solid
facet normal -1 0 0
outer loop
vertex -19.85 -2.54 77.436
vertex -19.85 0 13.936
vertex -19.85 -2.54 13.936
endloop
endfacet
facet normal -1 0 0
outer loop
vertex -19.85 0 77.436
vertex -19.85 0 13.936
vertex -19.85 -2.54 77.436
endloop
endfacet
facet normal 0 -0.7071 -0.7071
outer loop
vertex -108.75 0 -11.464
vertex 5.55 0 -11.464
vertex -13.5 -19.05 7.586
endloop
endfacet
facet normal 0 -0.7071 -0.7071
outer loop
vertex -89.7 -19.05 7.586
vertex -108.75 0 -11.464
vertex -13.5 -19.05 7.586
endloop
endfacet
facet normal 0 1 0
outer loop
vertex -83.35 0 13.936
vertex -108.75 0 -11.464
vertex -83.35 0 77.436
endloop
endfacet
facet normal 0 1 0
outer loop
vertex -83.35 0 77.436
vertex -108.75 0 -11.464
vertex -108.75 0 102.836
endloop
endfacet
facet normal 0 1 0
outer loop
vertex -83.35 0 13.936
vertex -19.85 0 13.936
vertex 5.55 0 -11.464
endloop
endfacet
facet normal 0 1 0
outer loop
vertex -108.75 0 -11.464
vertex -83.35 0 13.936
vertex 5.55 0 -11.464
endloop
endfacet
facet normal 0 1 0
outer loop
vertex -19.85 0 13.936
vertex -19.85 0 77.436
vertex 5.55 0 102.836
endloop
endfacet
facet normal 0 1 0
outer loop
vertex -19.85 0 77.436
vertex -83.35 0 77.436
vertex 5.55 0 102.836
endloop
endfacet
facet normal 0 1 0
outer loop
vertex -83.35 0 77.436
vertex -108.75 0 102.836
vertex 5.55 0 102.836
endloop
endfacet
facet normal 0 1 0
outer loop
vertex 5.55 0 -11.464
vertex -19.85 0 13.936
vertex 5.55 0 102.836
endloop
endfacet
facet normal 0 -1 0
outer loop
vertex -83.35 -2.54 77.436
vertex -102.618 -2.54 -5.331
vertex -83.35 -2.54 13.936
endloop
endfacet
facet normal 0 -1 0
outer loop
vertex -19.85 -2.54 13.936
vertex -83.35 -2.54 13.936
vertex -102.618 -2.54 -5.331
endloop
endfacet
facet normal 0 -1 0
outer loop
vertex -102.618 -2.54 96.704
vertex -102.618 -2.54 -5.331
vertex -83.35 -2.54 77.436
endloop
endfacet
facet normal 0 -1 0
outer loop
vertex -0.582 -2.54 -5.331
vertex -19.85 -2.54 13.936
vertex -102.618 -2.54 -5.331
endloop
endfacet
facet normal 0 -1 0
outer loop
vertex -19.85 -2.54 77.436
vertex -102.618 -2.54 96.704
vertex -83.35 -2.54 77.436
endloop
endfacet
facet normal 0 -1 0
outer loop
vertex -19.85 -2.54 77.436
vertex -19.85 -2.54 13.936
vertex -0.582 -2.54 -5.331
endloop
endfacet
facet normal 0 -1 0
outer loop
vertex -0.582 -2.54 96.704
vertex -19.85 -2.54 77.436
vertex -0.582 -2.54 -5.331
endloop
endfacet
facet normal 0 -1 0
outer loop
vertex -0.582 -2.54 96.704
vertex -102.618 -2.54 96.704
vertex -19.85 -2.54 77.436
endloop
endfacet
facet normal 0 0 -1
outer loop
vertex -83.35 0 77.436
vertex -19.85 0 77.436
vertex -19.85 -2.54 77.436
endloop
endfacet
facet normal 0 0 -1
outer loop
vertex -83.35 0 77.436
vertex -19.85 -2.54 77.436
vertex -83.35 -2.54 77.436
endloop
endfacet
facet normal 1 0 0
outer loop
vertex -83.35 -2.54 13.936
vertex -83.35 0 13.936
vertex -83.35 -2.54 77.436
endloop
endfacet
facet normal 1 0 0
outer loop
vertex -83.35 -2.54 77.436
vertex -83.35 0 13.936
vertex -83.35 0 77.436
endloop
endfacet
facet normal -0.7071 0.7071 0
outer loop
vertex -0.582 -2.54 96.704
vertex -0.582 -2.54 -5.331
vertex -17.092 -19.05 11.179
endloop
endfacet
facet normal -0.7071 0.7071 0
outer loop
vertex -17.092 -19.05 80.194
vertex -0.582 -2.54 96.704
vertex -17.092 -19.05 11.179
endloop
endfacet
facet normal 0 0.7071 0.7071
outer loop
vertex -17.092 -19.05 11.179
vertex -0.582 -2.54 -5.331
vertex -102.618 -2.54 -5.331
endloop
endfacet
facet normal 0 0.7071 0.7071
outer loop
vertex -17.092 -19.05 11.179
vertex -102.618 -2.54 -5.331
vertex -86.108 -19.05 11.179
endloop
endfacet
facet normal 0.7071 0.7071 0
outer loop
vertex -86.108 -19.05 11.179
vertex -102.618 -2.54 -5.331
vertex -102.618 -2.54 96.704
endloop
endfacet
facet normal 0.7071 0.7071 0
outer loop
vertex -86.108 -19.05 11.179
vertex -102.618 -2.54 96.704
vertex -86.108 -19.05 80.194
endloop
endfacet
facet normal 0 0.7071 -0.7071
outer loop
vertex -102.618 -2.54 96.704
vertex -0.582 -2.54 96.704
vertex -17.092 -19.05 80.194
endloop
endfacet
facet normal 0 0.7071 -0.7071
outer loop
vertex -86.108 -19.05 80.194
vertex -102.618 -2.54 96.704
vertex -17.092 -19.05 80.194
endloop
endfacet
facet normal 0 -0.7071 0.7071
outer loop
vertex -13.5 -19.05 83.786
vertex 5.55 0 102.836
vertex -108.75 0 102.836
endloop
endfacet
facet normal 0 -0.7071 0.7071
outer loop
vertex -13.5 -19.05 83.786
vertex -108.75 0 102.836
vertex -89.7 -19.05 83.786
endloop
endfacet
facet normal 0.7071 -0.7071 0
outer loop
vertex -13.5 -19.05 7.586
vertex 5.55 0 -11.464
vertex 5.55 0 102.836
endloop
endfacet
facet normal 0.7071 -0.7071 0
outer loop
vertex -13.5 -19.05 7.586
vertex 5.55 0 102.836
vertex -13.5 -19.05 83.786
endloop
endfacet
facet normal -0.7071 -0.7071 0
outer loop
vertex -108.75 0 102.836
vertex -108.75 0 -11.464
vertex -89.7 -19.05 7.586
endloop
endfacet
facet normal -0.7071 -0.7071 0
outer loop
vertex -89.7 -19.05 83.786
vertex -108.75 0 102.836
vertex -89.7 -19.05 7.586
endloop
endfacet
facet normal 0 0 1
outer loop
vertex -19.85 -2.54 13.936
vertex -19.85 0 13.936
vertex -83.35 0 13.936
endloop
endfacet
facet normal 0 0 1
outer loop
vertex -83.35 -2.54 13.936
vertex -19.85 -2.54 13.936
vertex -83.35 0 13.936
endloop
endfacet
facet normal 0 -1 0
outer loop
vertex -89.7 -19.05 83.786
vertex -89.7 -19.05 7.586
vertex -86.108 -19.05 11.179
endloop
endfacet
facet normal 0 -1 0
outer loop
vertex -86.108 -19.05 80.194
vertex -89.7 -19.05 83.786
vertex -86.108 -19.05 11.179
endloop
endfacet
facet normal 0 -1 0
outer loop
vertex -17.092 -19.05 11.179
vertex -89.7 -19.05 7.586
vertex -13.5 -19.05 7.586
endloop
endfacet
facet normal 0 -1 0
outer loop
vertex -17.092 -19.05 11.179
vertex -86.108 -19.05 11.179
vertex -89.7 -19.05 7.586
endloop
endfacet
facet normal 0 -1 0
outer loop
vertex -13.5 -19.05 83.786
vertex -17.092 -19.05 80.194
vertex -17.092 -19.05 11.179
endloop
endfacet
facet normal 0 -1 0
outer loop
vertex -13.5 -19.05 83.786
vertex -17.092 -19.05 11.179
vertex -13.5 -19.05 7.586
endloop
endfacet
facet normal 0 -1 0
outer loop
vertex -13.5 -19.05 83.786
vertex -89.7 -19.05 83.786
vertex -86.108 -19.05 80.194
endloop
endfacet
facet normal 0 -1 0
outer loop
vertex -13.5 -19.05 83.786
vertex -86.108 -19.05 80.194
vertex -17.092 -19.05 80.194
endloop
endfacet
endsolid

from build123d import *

# Parameters (mm, degrees)
F0_W        = 127
F0_H        = 127
F1_DEPTH    = 19.05
F2_T1_DEPTH = 257.6414957887
F2_T3_DEPTH = 257.6414957887
F3_T        = -2.54
F4_W        = 63.5
F4_H        = 63.5
F5_DEPTH    = 25.4


# Not quite as in the source:
# - a fillet or chamfer that OpenCascade refuses, or shapes differently, is made with other operations: its cross-section is extruded or revolved along the edge and cut away or added


with BuildPart() as f1:
    # F0 (on Front) → F1 (new body)
    with BuildSketch(Plane.XZ):
        with Locations((-51.5997745097, 45.6864875067)):
            Rectangle(F0_W, F0_H)
    extrude(amount=F1_DEPTH)

    # F2: chamfer of 25.4 on 4 edges, made by hand

    # F2_s2 → F2_t1 (cut)
    with BuildSketch(Plane.XY.offset(-83.1342603876)):
        Polygon((11.9002254903, 6.35), (-13.4997745097, -19.05), (11.9002254903, -19.05), align=None)
        Polygon((-115.0997745097, 6.35), (-89.6997745097, -19.05), (-115.0997745097, -19.05), align=None)
    extrude(amount=F2_T1_DEPTH, mode=Mode.SUBTRACT)

    # F2_s4 → F2_t3 (cut)
    with BuildSketch(Plane.YZ.offset(-180.420522404)):
        Polygon((6.35, 109.1864875067), (-19.05, 83.7864875067), (-19.05, 109.1864875067), align=None)
        Polygon((6.35, -17.8135124933), (-19.05, 7.5864875067), (-19.05, -17.8135124933), align=None)
    extrude(amount=F2_T3_DEPTH, mode=Mode.SUBTRACT)

    # F3
    f3_openings = [f1.faces().sort_by_distance(p)[0] for p in [
        (-51.599775, -19.05, 45.686488),
    ]]
    offset(amount=F3_T, openings=f3_openings, kind=Kind.INTERSECTION)

    # F4 (on face) → F5 (cut)
    with BuildSketch(Plane(origin=(0, 0, 0), x_dir=(-1, 0, 0), z_dir=(0, 1, 0))):
        with Locations((51.5997745097, 45.6864875067)):
            Rectangle(F4_W, F4_H)
    extrude(amount=-F5_DEPTH, mode=Mode.SUBTRACT)


solid = f1.part
